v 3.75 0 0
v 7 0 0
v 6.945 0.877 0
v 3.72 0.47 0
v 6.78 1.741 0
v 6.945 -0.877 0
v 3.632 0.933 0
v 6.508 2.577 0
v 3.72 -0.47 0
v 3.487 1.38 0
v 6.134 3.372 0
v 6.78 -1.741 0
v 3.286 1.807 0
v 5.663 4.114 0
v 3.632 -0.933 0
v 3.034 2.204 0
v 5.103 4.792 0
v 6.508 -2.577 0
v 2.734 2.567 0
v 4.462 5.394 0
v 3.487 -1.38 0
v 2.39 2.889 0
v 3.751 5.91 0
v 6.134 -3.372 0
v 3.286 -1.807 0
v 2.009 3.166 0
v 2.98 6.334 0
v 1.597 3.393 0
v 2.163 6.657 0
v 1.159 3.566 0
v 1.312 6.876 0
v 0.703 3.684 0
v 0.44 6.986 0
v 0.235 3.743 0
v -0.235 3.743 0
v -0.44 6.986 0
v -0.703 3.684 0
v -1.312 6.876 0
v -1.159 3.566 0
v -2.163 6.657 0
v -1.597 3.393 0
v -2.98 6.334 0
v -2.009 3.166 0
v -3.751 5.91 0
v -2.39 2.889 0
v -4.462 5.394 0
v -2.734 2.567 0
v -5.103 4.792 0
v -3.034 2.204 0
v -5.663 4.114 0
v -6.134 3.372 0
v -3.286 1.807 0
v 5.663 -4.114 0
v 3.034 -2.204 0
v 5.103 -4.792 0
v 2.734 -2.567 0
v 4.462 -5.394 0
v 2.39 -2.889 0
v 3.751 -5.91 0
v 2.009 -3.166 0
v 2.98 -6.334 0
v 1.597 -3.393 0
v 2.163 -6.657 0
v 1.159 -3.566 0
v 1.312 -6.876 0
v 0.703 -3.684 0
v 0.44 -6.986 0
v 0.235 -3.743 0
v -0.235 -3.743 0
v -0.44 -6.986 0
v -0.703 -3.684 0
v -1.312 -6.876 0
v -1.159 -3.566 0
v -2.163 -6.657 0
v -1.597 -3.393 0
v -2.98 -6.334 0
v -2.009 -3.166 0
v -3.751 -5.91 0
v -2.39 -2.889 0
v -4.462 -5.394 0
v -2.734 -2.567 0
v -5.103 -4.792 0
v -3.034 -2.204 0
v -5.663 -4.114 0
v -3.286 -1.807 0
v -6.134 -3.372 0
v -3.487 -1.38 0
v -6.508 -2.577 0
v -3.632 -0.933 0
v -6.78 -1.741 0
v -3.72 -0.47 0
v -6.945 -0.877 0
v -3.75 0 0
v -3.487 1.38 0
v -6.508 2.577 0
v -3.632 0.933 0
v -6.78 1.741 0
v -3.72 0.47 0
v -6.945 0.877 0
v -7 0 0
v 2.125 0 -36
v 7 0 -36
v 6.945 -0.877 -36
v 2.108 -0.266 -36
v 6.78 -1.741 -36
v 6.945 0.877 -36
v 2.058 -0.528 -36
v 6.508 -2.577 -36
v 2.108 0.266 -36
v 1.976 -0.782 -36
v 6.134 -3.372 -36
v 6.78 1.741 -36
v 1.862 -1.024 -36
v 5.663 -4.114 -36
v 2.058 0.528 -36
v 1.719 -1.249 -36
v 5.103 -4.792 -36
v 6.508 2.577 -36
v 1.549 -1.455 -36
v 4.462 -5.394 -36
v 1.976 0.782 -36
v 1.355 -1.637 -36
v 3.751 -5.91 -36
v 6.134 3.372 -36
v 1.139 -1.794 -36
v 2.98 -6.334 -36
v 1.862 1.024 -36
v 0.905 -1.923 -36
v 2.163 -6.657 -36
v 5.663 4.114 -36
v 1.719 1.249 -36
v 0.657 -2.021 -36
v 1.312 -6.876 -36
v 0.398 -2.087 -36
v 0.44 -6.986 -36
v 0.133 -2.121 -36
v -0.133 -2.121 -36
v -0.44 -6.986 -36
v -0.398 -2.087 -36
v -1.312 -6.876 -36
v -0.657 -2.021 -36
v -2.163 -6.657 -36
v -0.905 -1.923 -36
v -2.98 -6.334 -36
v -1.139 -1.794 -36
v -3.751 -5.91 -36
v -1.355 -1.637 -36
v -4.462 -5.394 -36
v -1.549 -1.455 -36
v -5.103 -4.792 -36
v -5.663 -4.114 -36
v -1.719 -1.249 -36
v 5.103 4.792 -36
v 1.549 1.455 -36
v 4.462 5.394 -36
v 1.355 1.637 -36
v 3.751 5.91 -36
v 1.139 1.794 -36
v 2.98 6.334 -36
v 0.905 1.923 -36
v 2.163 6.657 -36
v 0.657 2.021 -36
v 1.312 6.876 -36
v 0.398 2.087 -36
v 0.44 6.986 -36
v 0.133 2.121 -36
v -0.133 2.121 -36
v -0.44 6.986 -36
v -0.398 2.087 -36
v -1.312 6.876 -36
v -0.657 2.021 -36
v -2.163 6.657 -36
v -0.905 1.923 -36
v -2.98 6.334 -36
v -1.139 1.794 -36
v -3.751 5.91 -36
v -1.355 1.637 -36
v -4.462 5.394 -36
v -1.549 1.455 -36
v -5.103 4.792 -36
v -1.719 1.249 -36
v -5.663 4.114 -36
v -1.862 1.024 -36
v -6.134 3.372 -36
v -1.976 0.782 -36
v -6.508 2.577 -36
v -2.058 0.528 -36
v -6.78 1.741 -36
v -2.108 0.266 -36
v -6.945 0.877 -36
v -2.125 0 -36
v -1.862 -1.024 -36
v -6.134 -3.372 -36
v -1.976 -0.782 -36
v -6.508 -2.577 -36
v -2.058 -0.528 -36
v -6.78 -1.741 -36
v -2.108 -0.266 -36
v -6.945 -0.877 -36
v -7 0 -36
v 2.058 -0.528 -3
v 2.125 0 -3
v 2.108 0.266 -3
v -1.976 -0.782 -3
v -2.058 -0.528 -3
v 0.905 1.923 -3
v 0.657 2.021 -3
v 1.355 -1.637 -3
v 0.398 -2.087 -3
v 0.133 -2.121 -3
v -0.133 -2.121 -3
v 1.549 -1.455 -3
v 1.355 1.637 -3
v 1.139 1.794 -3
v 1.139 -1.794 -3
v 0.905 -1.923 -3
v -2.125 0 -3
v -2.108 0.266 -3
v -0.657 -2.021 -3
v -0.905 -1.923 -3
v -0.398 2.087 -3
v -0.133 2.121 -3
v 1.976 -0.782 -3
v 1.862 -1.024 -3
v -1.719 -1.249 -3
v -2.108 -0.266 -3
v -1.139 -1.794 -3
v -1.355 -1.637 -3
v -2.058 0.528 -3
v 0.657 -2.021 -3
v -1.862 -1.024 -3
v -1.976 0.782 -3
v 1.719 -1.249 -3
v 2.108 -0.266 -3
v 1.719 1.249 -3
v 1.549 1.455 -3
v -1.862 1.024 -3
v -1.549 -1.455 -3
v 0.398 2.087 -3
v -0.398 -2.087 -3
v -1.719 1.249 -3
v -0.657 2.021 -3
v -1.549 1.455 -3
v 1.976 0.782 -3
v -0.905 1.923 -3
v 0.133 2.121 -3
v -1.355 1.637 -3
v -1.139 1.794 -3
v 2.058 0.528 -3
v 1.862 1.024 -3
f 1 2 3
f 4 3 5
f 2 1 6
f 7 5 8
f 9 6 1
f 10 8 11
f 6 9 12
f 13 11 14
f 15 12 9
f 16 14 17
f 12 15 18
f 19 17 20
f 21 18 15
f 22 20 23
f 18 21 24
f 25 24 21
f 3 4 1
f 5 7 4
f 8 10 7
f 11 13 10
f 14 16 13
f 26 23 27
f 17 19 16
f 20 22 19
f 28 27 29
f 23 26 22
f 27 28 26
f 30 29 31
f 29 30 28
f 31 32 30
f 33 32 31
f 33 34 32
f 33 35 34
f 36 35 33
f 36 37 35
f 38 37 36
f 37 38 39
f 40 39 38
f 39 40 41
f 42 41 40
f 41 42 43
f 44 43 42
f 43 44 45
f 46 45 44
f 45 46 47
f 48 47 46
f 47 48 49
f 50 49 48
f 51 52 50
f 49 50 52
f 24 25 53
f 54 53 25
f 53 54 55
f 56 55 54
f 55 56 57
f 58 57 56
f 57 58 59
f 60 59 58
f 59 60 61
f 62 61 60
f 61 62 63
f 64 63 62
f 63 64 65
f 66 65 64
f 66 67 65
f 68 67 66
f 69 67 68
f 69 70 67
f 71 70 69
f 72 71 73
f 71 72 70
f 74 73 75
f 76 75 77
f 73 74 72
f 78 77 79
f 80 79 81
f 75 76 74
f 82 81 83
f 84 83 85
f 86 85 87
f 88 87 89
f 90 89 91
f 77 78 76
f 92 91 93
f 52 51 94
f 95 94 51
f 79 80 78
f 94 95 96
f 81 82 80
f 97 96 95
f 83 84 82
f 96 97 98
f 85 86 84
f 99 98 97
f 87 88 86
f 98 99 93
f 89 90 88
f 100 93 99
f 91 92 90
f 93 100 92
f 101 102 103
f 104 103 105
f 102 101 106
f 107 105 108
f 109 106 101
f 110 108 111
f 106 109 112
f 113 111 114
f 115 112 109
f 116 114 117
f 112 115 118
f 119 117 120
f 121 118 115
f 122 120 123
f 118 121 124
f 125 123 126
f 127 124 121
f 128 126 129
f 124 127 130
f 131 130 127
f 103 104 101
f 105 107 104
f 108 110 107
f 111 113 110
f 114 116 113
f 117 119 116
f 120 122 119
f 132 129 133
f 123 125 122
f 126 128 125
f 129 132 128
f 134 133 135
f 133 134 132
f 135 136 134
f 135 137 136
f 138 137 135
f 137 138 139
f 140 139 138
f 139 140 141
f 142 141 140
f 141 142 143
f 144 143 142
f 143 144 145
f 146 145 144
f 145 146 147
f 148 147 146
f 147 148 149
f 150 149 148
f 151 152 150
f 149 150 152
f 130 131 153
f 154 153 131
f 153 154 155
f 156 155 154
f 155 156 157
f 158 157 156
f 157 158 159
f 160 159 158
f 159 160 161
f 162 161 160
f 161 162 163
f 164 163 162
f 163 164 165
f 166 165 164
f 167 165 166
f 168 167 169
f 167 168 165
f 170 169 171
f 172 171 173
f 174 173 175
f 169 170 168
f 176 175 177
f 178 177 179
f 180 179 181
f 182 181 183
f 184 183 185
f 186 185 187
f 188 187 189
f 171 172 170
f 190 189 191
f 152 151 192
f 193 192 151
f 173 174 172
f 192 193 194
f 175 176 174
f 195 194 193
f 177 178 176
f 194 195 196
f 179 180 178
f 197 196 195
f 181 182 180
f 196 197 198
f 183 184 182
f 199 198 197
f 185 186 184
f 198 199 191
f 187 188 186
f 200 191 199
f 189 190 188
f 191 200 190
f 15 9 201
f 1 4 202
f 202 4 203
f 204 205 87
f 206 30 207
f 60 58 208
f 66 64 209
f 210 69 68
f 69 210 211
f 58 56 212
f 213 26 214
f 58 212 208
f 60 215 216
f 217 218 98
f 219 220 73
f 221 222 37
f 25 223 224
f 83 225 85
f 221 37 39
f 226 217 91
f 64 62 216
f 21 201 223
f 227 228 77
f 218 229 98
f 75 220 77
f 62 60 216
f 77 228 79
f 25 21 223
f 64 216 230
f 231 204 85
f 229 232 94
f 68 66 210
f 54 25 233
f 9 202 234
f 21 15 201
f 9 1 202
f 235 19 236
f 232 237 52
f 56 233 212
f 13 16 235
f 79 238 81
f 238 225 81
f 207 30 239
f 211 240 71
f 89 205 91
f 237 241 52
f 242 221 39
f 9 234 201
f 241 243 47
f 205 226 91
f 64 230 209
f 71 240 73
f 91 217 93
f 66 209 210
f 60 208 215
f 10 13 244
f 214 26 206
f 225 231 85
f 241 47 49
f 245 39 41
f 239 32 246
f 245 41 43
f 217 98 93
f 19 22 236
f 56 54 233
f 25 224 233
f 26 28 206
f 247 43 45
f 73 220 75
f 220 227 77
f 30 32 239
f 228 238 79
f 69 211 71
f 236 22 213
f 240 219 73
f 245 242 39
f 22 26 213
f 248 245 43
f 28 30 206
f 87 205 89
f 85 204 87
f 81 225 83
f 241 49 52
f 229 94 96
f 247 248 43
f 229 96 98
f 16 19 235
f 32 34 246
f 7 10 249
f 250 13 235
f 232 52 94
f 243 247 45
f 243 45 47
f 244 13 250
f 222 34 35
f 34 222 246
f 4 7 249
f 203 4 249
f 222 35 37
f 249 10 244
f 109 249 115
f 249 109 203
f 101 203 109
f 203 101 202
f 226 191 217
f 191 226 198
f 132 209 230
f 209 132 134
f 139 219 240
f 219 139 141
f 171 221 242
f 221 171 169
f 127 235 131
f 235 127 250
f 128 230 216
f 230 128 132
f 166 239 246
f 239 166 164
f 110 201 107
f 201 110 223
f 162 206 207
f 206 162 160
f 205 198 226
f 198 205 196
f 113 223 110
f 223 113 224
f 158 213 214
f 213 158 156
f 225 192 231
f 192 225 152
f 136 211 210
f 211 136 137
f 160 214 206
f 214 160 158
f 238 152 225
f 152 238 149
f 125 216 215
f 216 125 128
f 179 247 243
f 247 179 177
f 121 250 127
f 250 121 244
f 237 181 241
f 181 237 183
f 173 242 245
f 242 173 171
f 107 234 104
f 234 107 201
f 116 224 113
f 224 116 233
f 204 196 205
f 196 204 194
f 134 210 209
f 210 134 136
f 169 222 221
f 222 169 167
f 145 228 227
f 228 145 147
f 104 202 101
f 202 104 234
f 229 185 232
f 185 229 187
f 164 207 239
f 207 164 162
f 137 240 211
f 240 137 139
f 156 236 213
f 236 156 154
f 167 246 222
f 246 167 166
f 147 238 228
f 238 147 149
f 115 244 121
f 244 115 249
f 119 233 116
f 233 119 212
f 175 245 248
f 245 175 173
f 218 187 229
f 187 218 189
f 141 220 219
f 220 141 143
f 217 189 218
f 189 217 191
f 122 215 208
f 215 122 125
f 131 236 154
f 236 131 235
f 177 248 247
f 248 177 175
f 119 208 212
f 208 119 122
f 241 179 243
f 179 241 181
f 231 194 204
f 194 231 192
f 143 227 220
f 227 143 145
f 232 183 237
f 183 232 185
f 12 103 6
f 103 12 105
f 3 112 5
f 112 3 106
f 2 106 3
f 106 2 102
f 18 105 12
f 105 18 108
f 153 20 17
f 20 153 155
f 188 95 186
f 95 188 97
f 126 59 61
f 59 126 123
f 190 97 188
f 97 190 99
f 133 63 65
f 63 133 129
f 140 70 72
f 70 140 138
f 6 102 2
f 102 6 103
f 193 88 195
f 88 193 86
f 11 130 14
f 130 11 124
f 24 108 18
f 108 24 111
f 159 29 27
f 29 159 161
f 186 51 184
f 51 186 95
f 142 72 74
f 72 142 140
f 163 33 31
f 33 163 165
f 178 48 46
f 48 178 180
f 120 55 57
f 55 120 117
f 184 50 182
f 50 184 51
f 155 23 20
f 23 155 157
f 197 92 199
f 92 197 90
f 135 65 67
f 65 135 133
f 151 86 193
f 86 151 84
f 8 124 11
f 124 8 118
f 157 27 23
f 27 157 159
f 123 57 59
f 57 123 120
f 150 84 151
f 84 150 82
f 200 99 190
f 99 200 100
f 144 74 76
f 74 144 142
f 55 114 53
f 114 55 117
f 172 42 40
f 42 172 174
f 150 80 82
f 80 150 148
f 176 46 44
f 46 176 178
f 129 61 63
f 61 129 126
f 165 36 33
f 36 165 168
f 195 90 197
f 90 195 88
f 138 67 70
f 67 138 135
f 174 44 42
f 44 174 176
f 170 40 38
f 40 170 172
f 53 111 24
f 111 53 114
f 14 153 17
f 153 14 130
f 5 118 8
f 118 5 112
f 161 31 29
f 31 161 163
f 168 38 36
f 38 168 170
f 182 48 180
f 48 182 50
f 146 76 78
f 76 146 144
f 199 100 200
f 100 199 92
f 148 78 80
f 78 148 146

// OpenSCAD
$fn = 50;


difference() {
	union() {
		translate(v = [0, 0, -36.0000000000]) {
			cylinder(h = 36, r = 7.0000000000);
		}
		cylinder(h = 0, r = 17.0000000000);
	}
	union() {
		translate(v = [0, 0, 0]) {
			rotate(a = [0, 0, 0]) {
				difference() {
					union() {
						#translate(v = [0, 0, -36.0000000000]) {
							cylinder(h = 36, r = 2.0000000000);
						}
						#translate(v = [0, 0, -3]) {
							cylinder(h = 3, r1 = 2.1250000000, r2 = 3.7500000000);
						}
						#translate(v = [0, 0, -36.0000000000]) {
							cylinder(h = 36, r = 2.1250000000);
						}
						#translate(v = [0, 0, -36.0000000000]) {
							cylinder(h = 36, r = 2.0000000000);
						}
					}
					union();
				}
			}
		}
	}
}
